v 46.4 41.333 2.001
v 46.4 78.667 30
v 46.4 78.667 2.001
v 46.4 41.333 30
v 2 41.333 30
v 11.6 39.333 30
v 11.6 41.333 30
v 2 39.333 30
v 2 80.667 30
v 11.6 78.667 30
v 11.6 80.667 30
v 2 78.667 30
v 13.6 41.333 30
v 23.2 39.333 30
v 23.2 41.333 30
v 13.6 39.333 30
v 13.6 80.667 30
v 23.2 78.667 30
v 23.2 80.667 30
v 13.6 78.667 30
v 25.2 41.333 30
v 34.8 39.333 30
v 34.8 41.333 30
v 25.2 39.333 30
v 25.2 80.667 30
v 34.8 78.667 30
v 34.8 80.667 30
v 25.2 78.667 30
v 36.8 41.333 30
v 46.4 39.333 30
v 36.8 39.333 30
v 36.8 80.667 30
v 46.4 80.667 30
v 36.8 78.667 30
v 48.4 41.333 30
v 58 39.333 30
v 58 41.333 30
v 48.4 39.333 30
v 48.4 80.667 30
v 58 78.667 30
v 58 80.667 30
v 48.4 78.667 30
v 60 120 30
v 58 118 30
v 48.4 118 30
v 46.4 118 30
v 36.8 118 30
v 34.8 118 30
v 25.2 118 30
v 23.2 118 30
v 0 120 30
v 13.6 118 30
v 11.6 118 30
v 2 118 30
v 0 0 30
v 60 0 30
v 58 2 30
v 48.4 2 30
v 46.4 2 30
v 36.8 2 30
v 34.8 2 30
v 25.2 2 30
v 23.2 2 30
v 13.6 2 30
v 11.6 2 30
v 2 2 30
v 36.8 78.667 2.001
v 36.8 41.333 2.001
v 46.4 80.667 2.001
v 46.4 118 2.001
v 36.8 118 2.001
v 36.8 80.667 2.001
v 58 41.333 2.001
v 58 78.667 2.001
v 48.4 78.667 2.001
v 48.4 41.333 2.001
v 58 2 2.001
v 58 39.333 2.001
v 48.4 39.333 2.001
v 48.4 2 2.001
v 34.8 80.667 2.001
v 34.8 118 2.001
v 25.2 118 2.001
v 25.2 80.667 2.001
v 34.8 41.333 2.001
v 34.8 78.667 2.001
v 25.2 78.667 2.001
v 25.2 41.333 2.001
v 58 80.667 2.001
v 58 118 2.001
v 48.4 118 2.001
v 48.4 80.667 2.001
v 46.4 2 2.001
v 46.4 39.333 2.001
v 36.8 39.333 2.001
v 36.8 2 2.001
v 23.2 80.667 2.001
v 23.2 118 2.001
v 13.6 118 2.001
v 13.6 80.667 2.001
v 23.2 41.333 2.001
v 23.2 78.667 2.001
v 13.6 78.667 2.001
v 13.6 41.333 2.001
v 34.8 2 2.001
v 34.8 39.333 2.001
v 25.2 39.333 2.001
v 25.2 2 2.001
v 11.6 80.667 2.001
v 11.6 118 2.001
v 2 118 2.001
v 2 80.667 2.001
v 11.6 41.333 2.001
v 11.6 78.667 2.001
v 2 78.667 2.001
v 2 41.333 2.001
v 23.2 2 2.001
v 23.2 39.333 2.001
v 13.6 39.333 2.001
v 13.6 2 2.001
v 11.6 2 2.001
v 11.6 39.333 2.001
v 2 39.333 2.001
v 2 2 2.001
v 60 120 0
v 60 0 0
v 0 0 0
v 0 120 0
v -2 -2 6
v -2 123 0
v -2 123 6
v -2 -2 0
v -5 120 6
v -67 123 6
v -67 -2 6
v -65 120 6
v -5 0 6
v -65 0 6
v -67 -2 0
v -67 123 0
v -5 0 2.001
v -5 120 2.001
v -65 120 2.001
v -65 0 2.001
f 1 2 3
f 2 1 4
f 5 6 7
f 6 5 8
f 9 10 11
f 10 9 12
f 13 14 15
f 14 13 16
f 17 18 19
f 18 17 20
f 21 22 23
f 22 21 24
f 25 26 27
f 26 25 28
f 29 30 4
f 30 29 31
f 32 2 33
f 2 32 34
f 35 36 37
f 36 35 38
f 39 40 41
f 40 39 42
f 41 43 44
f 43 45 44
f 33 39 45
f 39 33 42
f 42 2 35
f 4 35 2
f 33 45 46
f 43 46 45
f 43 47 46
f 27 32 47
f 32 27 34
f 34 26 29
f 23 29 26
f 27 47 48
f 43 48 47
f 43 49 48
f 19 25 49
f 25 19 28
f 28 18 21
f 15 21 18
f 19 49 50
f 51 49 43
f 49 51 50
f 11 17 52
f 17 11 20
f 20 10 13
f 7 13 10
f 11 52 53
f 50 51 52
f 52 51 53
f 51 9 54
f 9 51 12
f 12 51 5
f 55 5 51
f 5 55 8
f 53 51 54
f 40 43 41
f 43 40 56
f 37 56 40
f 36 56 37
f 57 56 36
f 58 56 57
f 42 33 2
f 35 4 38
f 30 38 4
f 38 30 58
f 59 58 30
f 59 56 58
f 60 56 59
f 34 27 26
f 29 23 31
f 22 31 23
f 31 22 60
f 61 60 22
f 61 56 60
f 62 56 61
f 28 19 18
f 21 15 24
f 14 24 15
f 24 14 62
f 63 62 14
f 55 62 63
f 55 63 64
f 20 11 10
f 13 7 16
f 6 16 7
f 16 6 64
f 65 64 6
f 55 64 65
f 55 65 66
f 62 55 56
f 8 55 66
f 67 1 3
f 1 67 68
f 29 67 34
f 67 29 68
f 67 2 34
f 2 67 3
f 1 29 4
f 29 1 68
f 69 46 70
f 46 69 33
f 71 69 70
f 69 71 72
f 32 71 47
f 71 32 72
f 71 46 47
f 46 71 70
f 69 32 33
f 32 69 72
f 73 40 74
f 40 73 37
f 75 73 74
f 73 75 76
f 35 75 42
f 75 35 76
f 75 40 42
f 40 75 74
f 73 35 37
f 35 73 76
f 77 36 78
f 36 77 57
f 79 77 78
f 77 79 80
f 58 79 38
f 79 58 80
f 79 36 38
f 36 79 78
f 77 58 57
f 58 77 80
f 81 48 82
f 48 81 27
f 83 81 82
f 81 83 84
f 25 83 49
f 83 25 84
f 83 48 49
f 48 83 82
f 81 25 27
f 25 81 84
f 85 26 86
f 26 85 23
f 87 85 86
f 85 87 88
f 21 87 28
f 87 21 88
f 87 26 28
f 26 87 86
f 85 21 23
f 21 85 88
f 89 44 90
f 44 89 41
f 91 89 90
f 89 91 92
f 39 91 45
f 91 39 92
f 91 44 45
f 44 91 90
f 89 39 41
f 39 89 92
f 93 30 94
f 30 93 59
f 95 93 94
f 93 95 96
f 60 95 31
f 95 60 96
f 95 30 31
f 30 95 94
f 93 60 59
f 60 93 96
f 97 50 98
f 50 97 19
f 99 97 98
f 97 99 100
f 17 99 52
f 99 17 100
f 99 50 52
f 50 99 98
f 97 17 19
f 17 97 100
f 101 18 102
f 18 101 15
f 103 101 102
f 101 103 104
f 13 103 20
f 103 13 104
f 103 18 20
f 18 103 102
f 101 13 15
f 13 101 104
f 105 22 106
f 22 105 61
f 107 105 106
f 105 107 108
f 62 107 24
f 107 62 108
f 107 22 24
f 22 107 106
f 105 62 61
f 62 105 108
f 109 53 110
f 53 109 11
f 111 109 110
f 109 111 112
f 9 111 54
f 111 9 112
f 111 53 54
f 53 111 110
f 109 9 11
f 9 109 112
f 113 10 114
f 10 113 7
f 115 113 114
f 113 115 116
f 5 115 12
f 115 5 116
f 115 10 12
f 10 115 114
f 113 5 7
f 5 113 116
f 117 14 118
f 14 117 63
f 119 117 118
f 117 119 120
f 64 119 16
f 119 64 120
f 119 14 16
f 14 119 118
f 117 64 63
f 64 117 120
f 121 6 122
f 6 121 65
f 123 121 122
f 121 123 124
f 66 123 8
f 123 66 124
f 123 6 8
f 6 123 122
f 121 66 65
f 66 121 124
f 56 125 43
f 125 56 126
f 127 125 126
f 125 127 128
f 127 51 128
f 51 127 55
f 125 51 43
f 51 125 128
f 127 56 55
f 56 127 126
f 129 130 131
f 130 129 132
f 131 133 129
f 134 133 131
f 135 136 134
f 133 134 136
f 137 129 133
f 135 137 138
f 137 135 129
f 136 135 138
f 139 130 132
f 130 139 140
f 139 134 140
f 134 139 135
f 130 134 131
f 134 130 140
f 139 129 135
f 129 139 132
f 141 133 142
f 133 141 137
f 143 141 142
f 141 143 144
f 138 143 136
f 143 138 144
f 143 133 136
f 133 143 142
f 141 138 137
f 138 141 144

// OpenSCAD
union() {
  difference() {
    translate([30.0000000000, 60.0000000000, 15.0000000000]) {
      scale([60.0000000000, 120.0000000000, 30.0000000000]) {
        translate([-0.5000000000, -0.5000000000, -0.5000000000]) {
          cube([1, 1, 1]);
        }
      }
    }
    union() {
      union() {
        union() {
          union() {
            union() {
              union() {
                union() {
                  union() {
                    union() {
                      union() {
                        union() {
                          union() {
                            union() {
                              union() {
                                translate([41.6000000000, 60.0000000000, 16.0005000000]) {
                                  rotate([0.0000000000, 0.0000000000, 0.0000000000]) {
                                    scale([9.6000000000, 37.3340000000, 27.9990000000]) {
                                      translate([-0.5000000000, -0.5000000000, -0.5000000000]) {
                                        cube([1, 1, 1]);
                                      }
                                    }
                                  }
                                }
                                translate([41.6000000000, 99.3335000000, 16.0005000000]) {
                                  rotate([0.0000000000, 0.0000000000, 0.0000000000]) {
                                    scale([9.6000000000, 37.3330000000, 27.9990000000]) {
                                      translate([-0.5000000000, -0.5000000000, -0.5000000000]) {
                                        cube([1, 1, 1]);
                                      }
                                    }
                                  }
                                }
                              }
                              translate([53.2000000000, 60.0000000000, 16.0005000000]) {
                                rotate([0.0000000000, 0.0000000000, 0.0000000000]) {
                                  scale([9.6000000000, 37.3340000000, 27.9990000000]) {
                                    translate([-0.5000000000, -0.5000000000, -0.5000000000]) {
                                      cube([1, 1, 1]);
                                    }
                                  }
                                }
                              }
                            }
                            translate([53.2000000000, 20.6665000000, 16.0005000000]) {
                              rotate([0.0000000000, 0.0000000000, 0.0000000000]) {
                                scale([9.6000000000, 37.3330000000, 27.9990000000]) {
                                  translate([-0.5000000000, -0.5000000000, -0.5000000000]) {
                                    cube([1, 1, 1]);
                                  }
                                }
                              }
                            }
                          }
                          translate([30.0000000000, 99.3335000000, 16.0005000000]) {
                            rotate([0.0000000000, 0.0000000000, 0.0000000000]) {
                              scale([9.6000000000, 37.3330000000, 27.9990000000]) {
                                translate([-0.5000000000, -0.5000000000, -0.5000000000]) {
                                  cube([1, 1, 1]);
                                }
                              }
                            }
                          }
                        }
                        translate([30.0000000000, 60.0000000000, 16.0005000000]) {
                          rotate([0.0000000000, 0.0000000000, 0.0000000000]) {
                            scale([9.6000000000, 37.3340000000, 27.9990000000]) {
                              translate([-0.5000000000, -0.5000000000, -0.5000000000]) {
                                cube([1, 1, 1]);
                              }
                            }
                          }
                        }
                      }
                      translate([53.2000000000, 99.3335000000, 16.0005000000]) {
                        rotate([0.0000000000, 0.0000000000, 0.0000000000]) {
                          scale([9.6000000000, 37.3330000000, 27.9990000000]) {
                            translate([-0.5000000000, -0.5000000000, -0.5000000000]) {
                              cube([1, 1, 1]);
                            }
                          }
                        }
                      }
                    }
                    translate([41.6000000000, 20.6665000000, 16.0005000000]) {
                      rotate([0.0000000000, 0.0000000000, 0.0000000000]) {
                        scale([9.6000000000, 37.3330000000, 27.9990000000]) {
                          translate([-0.5000000000, -0.5000000000, -0.5000000000]) {
                            cube([1, 1, 1]);
                          }
                        }
                      }
                    }
                  }
                  translate([18.4000000000, 99.3335000000, 16.0005000000]) {
                    rotate([0.0000000000, 0.0000000000, 0.0000000000]) {
                      scale([9.6000000000, 37.3330000000, 27.9990000000]) {
                        translate([-0.5000000000, -0.5000000000, -0.5000000000]) {
                          cube([1, 1, 1]);
                        }
                      }
                    }
                  }
                }
                translate([18.4000000000, 60.0000000000, 16.0005000000]) {
                  rotate([0.0000000000, 0.0000000000, 0.0000000000]) {
                    scale([9.6000000000, 37.3340000000, 27.9990000000]) {
                      translate([-0.5000000000, -0.5000000000, -0.5000000000]) {
                        cube([1, 1, 1]);
                      }
                    }
                  }
                }
              }
              translate([30.0000000000, 20.6665000000, 16.0005000000]) {
                rotate([0.0000000000, 0.0000000000, 0.0000000000]) {
                  scale([9.6000000000, 37.3330000000, 27.9990000000]) {
                    translate([-0.5000000000, -0.5000000000, -0.5000000000]) {
                      cube([1, 1, 1]);
                    }
                  }
                }
              }
            }
            translate([6.8000000000, 99.3335000000, 16.0005000000]) {
              rotate([0.0000000000, 0.0000000000, 0.0000000000]) {
                scale([9.6000000000, 37.3330000000, 27.9990000000]) {
                  translate([-0.5000000000, -0.5000000000, -0.5000000000]) {
                    cube([1, 1, 1]);
                  }
                }
              }
            }
          }
          translate([6.8000000000, 60.0000000000, 16.0005000000]) {
            rotate([0.0000000000, 0.0000000000, 0.0000000000]) {
              scale([9.6000000000, 37.3340000000, 27.9990000000]) {
                translate([-0.5000000000, -0.5000000000, -0.5000000000]) {
                  cube([1, 1, 1]);
                }
              }
            }
          }
        }
        translate([18.4000000000, 20.6665000000, 16.0005000000]) {
          rotate([0.0000000000, 0.0000000000, 0.0000000000]) {
            scale([9.6000000000, 37.3330000000, 27.9990000000]) {
              translate([-0.5000000000, -0.5000000000, -0.5000000000]) {
                cube([1, 1, 1]);
              }
            }
          }
        }
      }
      translate([6.8000000000, 20.6665000000, 16.0005000000]) {
        rotate([0.0000000000, 0.0000000000, 0.0000000000]) {
          scale([9.6000000000, 37.3330000000, 27.9990000000]) {
            translate([-0.5000000000, -0.5000000000, -0.5000000000]) {
              cube([1, 1, 1]);
            }
          }
        }
      }
    }
  }
  difference() {
    translate([-34.5000240000, 60.5000000000, 3.0000000000]) {
      scale([65.0000000000, 125.0000000000, 6.0000000000]) {
        translate([-0.5000000000, -0.5000000000, -0.5000000000]) {
          cube([1, 1, 1]);
        }
      }
    }
    translate([-35.0000000000, 60.0000000000, 4.0005000000]) {
      rotate([0.0000000000, 0.0000000000, 0.0000000000]) {
        scale([60.0000000000, 120.0000000000, 3.9990000000]) {
          translate([-0.5000000000, -0.5000000000, -0.5000000000]) {
            cube([1, 1, 1]);
          }
        }
      }
    }
  }
}
